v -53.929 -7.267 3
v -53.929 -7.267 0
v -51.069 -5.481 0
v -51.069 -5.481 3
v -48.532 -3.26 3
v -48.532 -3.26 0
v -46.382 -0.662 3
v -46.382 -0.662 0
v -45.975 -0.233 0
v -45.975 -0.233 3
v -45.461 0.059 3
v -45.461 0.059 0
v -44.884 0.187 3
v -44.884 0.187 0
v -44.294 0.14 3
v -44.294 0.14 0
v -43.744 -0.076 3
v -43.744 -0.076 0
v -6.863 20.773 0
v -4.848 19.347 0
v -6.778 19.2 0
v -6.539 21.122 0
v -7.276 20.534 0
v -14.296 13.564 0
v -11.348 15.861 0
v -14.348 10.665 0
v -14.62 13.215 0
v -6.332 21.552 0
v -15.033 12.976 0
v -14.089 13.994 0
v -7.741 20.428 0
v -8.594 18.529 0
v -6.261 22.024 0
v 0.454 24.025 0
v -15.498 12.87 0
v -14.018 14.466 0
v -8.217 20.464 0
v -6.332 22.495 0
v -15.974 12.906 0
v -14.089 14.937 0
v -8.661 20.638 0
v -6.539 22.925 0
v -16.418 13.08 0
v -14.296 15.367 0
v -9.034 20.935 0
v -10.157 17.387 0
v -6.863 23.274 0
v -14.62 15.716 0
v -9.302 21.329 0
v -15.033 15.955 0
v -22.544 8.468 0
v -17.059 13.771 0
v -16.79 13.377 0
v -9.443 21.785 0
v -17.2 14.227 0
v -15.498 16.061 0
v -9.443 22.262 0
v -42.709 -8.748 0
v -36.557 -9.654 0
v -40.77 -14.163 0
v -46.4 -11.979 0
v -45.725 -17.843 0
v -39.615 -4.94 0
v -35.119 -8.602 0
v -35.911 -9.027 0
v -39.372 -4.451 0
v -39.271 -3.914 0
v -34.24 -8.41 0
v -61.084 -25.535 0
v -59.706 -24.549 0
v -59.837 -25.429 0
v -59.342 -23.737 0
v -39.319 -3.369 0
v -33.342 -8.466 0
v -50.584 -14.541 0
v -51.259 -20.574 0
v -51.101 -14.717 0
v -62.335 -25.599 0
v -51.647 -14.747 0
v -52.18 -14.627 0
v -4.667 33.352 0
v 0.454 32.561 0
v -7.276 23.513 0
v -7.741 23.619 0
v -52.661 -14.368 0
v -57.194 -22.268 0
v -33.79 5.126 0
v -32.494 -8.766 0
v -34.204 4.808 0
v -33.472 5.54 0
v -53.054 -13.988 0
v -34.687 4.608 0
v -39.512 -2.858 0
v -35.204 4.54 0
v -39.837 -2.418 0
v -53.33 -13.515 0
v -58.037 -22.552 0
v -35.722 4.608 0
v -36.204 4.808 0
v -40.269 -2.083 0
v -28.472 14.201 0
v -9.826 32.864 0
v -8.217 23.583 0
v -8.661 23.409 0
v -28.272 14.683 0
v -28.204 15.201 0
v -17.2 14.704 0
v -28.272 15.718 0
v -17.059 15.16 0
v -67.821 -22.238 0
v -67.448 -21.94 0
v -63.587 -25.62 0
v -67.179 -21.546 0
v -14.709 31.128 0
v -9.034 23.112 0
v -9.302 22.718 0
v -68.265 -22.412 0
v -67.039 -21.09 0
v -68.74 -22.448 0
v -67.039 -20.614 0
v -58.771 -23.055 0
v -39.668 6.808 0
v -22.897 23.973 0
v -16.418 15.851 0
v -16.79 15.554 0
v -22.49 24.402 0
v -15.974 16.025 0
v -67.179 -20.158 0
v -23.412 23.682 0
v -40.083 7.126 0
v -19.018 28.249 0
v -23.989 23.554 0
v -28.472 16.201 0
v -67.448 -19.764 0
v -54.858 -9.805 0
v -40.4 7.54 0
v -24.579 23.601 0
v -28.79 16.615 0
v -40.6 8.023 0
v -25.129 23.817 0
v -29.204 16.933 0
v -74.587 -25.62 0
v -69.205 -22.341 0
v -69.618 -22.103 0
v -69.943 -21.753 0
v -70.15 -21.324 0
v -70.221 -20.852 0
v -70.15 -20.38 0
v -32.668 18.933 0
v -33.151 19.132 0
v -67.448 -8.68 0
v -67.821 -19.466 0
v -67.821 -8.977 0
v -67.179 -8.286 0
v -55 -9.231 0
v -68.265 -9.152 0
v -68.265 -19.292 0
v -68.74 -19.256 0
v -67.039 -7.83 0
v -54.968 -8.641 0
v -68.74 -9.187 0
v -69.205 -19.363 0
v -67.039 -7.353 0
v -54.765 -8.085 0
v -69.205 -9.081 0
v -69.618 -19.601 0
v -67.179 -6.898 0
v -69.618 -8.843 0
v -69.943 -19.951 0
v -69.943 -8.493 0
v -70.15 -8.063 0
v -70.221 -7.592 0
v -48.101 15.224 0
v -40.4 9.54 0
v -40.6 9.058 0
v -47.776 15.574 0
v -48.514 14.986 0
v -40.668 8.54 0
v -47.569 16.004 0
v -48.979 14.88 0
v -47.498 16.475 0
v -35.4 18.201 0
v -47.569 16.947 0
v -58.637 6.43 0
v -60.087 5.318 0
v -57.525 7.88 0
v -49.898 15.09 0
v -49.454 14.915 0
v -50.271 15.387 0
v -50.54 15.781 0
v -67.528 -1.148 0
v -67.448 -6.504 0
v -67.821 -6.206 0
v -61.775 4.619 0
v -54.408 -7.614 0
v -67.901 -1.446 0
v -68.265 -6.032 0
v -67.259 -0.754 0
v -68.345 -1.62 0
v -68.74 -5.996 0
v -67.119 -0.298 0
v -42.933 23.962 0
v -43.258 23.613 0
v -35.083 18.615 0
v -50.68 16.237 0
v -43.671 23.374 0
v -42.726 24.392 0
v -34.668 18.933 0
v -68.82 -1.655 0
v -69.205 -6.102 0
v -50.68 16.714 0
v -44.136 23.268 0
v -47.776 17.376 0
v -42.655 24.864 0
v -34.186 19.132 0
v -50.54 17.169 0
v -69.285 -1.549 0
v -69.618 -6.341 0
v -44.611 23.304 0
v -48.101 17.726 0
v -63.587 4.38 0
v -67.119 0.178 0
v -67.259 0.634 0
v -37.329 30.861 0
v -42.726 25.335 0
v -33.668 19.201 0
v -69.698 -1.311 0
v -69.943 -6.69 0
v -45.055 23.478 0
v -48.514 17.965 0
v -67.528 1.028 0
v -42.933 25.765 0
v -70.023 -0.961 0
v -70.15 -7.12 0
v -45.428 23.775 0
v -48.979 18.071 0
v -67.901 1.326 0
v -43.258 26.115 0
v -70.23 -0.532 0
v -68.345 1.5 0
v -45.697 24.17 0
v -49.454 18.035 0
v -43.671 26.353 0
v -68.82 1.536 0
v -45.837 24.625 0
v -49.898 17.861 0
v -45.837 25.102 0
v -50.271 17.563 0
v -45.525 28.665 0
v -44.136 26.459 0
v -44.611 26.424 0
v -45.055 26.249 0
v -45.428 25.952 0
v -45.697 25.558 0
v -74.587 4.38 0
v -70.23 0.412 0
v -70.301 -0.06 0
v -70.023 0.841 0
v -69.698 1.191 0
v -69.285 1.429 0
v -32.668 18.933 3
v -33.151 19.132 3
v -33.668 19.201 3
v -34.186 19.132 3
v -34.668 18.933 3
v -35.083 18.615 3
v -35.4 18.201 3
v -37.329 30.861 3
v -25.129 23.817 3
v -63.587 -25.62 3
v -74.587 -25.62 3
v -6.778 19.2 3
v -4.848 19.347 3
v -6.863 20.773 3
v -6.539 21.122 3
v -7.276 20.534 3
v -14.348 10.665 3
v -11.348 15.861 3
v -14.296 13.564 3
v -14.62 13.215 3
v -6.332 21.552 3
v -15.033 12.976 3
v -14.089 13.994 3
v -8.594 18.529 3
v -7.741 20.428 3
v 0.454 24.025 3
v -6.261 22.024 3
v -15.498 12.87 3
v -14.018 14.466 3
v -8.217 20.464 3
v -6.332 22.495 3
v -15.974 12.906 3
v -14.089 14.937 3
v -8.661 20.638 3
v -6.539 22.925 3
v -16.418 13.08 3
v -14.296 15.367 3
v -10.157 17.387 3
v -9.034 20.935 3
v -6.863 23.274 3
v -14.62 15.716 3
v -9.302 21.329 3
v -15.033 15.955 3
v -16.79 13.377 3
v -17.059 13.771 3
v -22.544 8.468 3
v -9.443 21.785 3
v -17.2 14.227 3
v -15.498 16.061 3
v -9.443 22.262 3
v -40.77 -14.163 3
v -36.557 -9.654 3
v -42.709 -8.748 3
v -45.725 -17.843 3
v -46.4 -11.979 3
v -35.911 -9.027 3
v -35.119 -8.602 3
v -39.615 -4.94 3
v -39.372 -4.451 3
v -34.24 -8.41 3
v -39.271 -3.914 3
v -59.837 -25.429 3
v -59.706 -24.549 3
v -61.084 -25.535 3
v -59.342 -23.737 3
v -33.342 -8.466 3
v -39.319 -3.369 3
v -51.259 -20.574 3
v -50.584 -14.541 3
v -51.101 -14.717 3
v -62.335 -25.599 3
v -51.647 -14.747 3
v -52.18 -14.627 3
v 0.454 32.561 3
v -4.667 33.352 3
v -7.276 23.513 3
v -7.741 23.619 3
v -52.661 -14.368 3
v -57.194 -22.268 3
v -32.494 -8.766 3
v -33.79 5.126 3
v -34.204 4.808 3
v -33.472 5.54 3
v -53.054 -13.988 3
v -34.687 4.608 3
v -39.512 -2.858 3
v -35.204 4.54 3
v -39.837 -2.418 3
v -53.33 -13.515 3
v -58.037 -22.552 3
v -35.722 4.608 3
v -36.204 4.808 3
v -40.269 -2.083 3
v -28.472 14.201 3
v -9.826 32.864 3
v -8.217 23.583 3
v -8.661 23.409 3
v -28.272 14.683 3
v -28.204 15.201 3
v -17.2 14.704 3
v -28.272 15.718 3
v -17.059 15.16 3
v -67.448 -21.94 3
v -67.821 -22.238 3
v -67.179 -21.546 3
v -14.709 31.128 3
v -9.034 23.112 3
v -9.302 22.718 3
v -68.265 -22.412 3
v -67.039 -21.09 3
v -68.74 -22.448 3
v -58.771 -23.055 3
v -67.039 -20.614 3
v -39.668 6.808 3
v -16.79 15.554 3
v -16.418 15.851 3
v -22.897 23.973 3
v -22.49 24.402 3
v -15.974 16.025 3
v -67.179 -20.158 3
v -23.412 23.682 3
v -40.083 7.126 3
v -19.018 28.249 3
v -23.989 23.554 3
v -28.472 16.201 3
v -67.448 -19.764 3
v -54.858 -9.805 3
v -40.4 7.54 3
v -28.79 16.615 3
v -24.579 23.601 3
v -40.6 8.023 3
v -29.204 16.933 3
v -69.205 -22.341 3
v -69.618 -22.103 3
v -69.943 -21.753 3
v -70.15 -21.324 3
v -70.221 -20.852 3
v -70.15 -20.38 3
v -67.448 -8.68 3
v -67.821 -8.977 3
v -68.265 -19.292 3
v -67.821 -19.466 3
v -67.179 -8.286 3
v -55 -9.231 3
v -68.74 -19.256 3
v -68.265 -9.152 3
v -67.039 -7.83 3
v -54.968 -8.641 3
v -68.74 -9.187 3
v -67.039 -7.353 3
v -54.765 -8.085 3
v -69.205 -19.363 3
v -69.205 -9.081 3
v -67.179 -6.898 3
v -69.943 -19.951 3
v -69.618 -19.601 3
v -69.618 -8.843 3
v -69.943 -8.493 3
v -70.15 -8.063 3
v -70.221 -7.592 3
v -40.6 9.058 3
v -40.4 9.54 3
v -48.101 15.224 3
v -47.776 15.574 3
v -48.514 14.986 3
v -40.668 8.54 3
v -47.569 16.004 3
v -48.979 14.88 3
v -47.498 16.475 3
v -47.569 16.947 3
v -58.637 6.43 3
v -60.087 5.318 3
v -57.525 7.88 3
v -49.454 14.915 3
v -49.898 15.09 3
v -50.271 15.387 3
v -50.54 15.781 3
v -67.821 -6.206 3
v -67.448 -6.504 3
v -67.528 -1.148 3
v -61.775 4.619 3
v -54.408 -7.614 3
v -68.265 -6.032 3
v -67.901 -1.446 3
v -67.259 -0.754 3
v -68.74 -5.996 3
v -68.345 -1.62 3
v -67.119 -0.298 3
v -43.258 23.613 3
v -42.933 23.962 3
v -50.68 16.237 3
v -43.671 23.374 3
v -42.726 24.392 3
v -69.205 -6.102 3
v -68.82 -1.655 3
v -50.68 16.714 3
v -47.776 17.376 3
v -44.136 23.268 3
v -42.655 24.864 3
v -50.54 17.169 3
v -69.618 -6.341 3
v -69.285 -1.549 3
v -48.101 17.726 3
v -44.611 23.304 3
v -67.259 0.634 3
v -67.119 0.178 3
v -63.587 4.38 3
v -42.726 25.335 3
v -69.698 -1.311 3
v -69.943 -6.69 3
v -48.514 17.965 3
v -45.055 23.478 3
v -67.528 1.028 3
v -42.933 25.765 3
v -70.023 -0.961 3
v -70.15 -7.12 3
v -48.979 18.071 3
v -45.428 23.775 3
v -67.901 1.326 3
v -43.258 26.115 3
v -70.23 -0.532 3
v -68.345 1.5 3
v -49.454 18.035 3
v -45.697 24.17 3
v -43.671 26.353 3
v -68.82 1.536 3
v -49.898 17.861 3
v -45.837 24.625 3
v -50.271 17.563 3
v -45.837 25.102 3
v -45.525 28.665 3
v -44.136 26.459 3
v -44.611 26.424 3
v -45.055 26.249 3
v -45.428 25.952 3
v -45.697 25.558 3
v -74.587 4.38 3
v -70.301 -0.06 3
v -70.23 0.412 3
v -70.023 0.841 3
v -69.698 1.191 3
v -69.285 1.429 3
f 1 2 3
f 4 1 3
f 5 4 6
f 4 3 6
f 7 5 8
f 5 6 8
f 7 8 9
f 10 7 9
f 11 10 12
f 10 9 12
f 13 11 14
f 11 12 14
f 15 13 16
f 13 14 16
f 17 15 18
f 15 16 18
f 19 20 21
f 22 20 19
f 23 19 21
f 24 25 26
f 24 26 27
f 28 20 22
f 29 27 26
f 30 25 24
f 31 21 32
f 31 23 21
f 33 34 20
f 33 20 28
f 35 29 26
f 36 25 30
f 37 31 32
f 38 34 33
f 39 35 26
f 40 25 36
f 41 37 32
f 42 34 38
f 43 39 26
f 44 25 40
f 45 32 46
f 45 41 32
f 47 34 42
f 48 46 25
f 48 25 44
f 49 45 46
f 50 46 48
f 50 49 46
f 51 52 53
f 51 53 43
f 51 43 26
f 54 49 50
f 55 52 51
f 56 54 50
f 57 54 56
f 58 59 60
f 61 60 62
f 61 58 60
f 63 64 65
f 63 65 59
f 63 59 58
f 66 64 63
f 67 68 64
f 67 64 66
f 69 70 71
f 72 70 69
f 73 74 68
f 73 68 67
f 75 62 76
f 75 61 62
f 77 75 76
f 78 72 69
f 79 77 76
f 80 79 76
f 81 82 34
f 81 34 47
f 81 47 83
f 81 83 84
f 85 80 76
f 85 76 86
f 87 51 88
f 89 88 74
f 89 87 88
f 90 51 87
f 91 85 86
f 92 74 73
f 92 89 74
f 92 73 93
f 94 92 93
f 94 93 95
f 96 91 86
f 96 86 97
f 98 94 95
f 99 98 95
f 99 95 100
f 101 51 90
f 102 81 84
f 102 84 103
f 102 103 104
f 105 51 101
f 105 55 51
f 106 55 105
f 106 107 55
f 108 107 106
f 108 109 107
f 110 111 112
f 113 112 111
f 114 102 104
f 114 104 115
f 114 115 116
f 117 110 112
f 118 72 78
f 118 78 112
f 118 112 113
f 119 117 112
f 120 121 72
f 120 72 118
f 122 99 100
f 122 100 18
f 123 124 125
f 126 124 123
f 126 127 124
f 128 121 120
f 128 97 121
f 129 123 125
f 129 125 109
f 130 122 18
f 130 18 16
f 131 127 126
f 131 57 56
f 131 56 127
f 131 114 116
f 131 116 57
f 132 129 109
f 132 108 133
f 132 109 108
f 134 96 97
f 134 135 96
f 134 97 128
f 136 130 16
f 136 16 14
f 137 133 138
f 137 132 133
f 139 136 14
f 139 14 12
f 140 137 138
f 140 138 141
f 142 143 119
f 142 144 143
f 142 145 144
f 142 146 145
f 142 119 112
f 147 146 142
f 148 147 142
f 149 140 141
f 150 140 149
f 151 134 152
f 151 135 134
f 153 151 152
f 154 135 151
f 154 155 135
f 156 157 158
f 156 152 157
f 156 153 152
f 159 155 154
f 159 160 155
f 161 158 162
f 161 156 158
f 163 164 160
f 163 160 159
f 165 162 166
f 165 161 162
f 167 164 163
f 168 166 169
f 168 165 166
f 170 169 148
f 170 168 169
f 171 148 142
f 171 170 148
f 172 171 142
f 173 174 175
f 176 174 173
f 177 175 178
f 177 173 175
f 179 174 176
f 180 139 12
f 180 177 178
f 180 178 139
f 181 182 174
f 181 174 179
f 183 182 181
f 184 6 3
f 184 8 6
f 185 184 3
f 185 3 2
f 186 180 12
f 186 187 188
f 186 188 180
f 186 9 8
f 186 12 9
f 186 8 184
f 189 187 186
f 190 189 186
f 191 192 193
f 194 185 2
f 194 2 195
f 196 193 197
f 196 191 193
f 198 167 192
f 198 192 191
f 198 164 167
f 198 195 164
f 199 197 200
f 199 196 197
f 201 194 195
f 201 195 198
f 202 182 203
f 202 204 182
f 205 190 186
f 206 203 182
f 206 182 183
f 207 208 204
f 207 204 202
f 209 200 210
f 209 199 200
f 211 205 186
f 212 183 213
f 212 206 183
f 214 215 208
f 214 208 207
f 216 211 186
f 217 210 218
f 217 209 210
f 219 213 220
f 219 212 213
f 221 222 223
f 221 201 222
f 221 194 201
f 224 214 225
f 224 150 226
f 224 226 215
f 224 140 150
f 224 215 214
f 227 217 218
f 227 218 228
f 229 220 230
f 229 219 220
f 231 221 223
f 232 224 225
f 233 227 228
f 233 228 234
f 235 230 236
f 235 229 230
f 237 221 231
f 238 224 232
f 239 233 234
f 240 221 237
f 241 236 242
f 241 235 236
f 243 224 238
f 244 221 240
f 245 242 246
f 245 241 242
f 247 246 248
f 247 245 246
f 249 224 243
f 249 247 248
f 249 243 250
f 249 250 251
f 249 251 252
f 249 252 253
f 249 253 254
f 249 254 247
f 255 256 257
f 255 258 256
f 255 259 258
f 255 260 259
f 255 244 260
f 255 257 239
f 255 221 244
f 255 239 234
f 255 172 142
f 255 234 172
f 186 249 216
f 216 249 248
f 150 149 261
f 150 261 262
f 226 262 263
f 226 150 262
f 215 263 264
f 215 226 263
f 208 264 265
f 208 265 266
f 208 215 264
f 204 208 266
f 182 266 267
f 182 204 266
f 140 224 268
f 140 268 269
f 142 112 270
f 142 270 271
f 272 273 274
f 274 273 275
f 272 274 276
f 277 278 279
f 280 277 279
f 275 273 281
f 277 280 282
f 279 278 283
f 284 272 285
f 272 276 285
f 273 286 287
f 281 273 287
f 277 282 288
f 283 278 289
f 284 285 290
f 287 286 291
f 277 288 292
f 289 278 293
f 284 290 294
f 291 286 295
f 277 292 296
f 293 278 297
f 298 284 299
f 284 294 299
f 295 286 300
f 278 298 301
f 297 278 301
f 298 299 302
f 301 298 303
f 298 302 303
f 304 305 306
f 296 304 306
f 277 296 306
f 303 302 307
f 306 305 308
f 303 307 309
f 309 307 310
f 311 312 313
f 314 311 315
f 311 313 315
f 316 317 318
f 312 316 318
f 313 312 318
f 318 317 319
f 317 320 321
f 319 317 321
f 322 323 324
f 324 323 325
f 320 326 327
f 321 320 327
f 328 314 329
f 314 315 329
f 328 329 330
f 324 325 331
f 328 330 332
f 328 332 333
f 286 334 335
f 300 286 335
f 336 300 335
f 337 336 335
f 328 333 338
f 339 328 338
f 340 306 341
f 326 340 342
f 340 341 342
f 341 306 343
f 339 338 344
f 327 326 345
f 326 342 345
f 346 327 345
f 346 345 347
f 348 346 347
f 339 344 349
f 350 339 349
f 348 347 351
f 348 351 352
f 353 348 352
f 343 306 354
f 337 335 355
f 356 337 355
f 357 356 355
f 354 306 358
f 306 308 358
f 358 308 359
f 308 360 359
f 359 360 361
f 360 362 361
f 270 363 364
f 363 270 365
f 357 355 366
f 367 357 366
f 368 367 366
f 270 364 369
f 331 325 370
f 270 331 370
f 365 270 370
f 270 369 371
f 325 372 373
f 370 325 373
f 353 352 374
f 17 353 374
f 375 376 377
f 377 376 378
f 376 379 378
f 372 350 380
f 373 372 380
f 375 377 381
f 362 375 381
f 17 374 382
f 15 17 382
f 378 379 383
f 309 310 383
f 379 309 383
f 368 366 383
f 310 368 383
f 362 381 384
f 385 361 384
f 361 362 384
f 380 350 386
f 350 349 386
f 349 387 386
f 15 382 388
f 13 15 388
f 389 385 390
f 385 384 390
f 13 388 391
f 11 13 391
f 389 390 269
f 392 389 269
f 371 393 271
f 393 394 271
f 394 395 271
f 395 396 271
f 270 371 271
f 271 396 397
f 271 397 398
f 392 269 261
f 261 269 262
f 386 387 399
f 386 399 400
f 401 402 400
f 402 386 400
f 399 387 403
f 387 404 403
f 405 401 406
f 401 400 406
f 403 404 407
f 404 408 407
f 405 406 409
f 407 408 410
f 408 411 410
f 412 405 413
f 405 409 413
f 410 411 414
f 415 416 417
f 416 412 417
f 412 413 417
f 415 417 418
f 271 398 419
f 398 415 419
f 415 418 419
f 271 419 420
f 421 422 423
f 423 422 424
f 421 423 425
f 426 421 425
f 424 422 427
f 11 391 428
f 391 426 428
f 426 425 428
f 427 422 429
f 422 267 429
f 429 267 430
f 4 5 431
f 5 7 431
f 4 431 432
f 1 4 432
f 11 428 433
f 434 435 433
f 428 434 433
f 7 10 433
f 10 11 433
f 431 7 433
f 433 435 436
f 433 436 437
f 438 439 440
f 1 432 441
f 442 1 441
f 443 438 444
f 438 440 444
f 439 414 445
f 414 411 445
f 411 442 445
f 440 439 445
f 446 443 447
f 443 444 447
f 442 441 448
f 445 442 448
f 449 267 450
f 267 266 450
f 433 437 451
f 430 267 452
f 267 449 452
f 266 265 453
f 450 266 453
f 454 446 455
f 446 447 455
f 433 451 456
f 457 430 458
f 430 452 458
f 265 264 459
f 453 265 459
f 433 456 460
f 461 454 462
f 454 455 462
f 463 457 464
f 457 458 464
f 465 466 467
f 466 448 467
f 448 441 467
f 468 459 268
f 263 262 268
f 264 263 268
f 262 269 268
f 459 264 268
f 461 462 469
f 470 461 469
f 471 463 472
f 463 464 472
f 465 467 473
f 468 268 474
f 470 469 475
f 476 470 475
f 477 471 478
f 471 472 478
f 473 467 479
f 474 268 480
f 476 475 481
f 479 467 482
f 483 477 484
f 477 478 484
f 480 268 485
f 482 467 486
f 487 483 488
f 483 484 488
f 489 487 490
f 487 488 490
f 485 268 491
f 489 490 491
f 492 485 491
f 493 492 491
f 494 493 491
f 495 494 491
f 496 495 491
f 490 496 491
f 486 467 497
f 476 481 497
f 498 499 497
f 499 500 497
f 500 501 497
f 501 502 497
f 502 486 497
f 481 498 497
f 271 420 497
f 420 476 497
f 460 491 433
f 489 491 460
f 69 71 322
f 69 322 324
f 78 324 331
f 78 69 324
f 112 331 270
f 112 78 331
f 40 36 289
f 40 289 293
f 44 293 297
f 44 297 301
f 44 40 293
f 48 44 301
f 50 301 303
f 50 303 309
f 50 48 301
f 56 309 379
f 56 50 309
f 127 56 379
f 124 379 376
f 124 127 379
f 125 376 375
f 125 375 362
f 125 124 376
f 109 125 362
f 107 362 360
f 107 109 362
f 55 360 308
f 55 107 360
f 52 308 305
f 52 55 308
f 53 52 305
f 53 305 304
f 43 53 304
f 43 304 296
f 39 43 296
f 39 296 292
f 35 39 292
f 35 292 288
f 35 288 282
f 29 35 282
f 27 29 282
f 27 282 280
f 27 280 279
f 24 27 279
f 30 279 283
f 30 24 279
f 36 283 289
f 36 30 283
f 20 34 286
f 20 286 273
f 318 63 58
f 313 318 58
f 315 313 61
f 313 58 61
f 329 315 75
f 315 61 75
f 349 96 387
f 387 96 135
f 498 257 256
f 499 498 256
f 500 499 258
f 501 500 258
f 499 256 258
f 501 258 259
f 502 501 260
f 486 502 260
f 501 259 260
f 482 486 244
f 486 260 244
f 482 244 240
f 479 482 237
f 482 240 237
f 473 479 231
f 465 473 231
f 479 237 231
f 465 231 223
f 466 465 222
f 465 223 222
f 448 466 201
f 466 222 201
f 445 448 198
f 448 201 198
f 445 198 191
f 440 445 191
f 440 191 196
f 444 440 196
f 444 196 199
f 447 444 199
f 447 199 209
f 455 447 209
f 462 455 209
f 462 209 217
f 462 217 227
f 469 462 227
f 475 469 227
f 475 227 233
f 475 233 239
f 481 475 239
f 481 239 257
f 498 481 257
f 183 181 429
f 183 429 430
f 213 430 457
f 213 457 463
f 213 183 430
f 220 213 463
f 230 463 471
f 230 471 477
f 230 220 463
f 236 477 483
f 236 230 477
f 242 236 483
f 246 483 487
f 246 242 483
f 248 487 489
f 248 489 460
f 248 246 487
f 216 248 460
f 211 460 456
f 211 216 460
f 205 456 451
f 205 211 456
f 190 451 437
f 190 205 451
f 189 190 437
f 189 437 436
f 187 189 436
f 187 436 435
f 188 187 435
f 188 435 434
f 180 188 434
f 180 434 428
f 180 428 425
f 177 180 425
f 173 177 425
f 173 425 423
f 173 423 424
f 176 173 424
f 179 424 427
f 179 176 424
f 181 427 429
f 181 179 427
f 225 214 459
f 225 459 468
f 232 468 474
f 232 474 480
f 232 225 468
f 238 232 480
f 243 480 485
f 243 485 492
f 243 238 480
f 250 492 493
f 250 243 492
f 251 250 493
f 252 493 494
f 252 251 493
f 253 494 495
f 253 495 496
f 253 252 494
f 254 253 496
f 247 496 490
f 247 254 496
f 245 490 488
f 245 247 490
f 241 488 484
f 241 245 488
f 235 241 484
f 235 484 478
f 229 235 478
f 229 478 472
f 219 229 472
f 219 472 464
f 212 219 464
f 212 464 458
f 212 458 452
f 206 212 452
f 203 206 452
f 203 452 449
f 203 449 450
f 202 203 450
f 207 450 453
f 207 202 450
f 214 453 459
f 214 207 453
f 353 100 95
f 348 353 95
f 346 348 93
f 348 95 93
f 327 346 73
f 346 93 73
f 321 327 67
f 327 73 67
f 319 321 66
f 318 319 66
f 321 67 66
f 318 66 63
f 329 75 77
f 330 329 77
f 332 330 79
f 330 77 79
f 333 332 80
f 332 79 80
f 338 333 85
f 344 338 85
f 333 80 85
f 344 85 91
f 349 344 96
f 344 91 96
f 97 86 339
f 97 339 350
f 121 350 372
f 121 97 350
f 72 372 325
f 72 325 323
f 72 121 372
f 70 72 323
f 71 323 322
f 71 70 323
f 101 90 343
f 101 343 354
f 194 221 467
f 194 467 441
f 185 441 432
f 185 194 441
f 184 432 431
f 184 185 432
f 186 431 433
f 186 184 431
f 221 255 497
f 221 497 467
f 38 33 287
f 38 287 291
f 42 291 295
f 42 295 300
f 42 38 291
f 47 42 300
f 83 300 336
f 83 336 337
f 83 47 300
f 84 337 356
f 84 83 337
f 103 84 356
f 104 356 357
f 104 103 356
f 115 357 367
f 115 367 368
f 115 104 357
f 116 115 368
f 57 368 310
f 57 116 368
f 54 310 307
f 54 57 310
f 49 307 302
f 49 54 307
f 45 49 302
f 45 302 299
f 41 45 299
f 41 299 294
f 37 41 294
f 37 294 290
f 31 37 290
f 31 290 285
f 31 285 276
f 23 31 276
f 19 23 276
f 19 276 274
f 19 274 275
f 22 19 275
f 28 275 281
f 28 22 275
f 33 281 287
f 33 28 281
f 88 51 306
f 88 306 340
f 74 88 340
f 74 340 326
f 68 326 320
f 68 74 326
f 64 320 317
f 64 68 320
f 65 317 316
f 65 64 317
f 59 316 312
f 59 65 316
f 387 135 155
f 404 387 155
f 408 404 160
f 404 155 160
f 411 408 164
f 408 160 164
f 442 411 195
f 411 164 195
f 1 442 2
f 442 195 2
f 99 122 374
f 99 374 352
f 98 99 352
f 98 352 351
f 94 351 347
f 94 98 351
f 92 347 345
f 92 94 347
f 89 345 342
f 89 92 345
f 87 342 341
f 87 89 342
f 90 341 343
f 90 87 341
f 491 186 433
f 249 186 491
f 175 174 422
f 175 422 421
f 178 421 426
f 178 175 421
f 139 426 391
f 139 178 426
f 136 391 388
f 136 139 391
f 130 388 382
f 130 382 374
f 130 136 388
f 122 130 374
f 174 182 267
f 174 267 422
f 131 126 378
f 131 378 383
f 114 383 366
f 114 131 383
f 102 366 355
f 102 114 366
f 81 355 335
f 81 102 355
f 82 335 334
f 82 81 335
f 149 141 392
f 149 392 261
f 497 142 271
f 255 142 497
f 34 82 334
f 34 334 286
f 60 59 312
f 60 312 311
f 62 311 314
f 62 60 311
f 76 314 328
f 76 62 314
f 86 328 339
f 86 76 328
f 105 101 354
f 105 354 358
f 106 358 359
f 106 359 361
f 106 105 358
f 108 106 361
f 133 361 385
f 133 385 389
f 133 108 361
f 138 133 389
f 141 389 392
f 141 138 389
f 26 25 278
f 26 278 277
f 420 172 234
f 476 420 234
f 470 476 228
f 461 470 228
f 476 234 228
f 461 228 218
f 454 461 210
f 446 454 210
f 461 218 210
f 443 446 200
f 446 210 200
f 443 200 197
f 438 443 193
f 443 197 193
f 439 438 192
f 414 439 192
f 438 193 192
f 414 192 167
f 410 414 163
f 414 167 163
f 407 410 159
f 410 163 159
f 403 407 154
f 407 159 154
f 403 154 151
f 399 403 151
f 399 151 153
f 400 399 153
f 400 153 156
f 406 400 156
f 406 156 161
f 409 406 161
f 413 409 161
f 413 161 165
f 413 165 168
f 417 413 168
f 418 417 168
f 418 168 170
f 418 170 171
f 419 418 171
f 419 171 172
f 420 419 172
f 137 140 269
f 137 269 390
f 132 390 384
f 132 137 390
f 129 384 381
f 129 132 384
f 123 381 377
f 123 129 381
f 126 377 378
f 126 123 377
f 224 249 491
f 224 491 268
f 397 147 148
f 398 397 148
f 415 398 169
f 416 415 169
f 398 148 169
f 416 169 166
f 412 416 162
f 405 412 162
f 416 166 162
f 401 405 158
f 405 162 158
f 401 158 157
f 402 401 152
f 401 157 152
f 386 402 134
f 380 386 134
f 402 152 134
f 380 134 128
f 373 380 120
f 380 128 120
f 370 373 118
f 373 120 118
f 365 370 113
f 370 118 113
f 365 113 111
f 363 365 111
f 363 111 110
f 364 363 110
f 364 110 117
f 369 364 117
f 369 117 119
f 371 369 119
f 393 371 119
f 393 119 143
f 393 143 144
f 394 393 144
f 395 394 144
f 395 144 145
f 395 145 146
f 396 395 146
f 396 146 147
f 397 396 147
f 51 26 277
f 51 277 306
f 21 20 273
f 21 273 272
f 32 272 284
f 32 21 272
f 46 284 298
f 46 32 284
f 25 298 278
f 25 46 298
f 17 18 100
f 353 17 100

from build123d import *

# Parameters (mm, degrees)
SKETCH1_R          = 1.6
EXTRUDE1_DEPTH     = 3
SKETCH2_R          = 1.6
CUT_EXTRUDE1_DEPTH = 10


with BuildPart() as part:
    # Sketch1 → Extrude1 (new body)
    with BuildSketch(Plane.XY):
        with BuildLine():
            Line((-45.524801784, 28.664626531), (-37.328649362, 30.860778953))
            Line((-37.328649362, 30.860778953), (-25.128844255, 23.817218191))
            ThreePointArc((-25.128844255, 23.817218191), (-23.695769789, 23.596720278), (-22.490310791, 24.402443777))
            ThreePointArc((-22.490310791, 24.402443777), (-12.321299382, 32.147149867), (0.454378412, 32.561060923))
            Line((0.454378412, 32.561060923), (0.454378412, 24.024885934))
            Line((0.454378412, 24.024885934), (-4.848291471, 19.347098838))
            ThreePointArc((-4.848291471, 19.347098838), (-8.594498853, 18.529402179), (-11.347887248, 15.860778953))
            Line((-11.347887248, 15.860778953), (-14.347887248, 10.664626531))
            Line((-14.347887248, 10.664626531), (-22.544039671, 8.468474108))
            Line((-22.544039671, 8.468474108), (-32.494200847, -8.765710592))
            ThreePointArc((-32.494200847, -8.765710592), (-34.686208494, -8.475053996), (-36.556835292, -9.654093507))
            ThreePointArc((-36.556835292, -9.654093507), (-45.724735719, -17.843308487), (-57.193646277, -22.26798145))
            ThreePointArc((-57.193646277, -22.26798145), (-59.080348228, -23.376243821), (-59.836827788, -25.429443375))
            ThreePointArc((-59.836827788, -25.429443375), (-61.709484996, -25.572317511), (-63.586979611, -25.61998316))
            Line((-63.586979611, -25.61998316), (-74.586979611, -25.61998316))
            Line((-74.586979611, -25.61998316), (-74.586979611, 4.38001684))
            Line((-74.586979611, 4.38001684), (-63.586979611, 4.38001684))
            ThreePointArc((-63.586979611, 4.38001684), (-60.086979611, 5.317839013), (-57.524801784, 7.88001684))
            Line((-57.524801784, 7.88001684), (-45.524801784, 28.664626531))
        make_face()
        with Locations((-7.860838428, 22.023527558)):
            Circle(SKETCH1_R, mode=Mode.SUBTRACT)
        with Locations((-15.617536335, 14.465529805)):
            Circle(SKETCH1_R, mode=Mode.SUBTRACT)
        with Locations((-44.255152698, 24.863723257)):
            Circle(SKETCH1_R, mode=Mode.SUBTRACT)
        with Locations((-49.098298448, 16.475148748)):
            Circle(SKETCH1_R, mode=Mode.SUBTRACT)
        with BuildLine():
            Line((-43.743844778, -0.076422397), (-40.268531978, -2.082895178))
            ThreePointArc((-40.268531978, -2.082895178), (-39.318822643, -3.369262792), (-39.615313635, -4.940498787))
            ThreePointArc((-39.615313635, -4.940498787), (-44.486377663, -10.44123439), (-50.583544918, -14.541223219))
            ThreePointArc((-50.583544918, -14.541223219), (-52.180202255, -14.627099929), (-53.329522835, -13.515456253))
            Line((-53.329522835, -13.515456253), (-54.858264001, -9.80510822))
            ThreePointArc((-54.858264001, -9.80510822), (-54.887106697, -8.355456589), (-53.928892503, -7.267271258))
            ThreePointArc((-53.928892503, -7.267271258), (-49.755509235, -4.421578878), (-46.382378242, -0.661647984))
            ThreePointArc((-46.382378242, -0.661647984), (-45.176919243, 0.144075516), (-43.743844778, -0.076422397))
        make_face(mode=Mode.SUBTRACT)
        with BuildLine():
            Line((-33.472242901, 5.540270878), (-28.472242901, 14.200524916))
            ThreePointArc((-28.472242901, 14.200524916), (-28.272442056, 15.718163006), (-29.204293709, 16.932575723))
            Line((-29.204293709, 16.932575723), (-32.668395324, 18.932575723))
            ThreePointArc((-32.668395324, 18.932575723), (-34.186033414, 19.132376568), (-35.400446131, 18.200524916))
            Line((-35.400446131, 18.200524916), (-40.400446131, 9.540270878))
            ThreePointArc((-40.400446131, 9.540270878), (-40.600246976, 8.022632788), (-39.668395324, 6.80822007))
            Line((-39.668395324, 6.80822007), (-36.204293709, 4.80822007))
            ThreePointArc((-36.204293709, 4.80822007), (-34.686655618, 4.608419225), (-33.472242901, 5.540270878))
        make_face(mode=Mode.SUBTRACT)
    extrude(amount=EXTRUDE1_DEPTH)

    # Sketch2 → Cut-Extrude1 (cut)
    with BuildSketch(Plane(origin=(0, 0, 0), x_dir=(-1, 0, 0), z_dir=(0, 0, -1))):
        with Locations((68.700777825, -0.059973733)):
            Circle(SKETCH2_R)
        with Locations((68.620801918, -7.591809129)):
            Circle(SKETCH2_R)
        with Locations((68.620801918, -20.85197665)):
            Circle(SKETCH2_R)
    extrude(amount=-CUT_EXTRUDE1_DEPTH, mode=Mode.SUBTRACT)


solid = part.part
